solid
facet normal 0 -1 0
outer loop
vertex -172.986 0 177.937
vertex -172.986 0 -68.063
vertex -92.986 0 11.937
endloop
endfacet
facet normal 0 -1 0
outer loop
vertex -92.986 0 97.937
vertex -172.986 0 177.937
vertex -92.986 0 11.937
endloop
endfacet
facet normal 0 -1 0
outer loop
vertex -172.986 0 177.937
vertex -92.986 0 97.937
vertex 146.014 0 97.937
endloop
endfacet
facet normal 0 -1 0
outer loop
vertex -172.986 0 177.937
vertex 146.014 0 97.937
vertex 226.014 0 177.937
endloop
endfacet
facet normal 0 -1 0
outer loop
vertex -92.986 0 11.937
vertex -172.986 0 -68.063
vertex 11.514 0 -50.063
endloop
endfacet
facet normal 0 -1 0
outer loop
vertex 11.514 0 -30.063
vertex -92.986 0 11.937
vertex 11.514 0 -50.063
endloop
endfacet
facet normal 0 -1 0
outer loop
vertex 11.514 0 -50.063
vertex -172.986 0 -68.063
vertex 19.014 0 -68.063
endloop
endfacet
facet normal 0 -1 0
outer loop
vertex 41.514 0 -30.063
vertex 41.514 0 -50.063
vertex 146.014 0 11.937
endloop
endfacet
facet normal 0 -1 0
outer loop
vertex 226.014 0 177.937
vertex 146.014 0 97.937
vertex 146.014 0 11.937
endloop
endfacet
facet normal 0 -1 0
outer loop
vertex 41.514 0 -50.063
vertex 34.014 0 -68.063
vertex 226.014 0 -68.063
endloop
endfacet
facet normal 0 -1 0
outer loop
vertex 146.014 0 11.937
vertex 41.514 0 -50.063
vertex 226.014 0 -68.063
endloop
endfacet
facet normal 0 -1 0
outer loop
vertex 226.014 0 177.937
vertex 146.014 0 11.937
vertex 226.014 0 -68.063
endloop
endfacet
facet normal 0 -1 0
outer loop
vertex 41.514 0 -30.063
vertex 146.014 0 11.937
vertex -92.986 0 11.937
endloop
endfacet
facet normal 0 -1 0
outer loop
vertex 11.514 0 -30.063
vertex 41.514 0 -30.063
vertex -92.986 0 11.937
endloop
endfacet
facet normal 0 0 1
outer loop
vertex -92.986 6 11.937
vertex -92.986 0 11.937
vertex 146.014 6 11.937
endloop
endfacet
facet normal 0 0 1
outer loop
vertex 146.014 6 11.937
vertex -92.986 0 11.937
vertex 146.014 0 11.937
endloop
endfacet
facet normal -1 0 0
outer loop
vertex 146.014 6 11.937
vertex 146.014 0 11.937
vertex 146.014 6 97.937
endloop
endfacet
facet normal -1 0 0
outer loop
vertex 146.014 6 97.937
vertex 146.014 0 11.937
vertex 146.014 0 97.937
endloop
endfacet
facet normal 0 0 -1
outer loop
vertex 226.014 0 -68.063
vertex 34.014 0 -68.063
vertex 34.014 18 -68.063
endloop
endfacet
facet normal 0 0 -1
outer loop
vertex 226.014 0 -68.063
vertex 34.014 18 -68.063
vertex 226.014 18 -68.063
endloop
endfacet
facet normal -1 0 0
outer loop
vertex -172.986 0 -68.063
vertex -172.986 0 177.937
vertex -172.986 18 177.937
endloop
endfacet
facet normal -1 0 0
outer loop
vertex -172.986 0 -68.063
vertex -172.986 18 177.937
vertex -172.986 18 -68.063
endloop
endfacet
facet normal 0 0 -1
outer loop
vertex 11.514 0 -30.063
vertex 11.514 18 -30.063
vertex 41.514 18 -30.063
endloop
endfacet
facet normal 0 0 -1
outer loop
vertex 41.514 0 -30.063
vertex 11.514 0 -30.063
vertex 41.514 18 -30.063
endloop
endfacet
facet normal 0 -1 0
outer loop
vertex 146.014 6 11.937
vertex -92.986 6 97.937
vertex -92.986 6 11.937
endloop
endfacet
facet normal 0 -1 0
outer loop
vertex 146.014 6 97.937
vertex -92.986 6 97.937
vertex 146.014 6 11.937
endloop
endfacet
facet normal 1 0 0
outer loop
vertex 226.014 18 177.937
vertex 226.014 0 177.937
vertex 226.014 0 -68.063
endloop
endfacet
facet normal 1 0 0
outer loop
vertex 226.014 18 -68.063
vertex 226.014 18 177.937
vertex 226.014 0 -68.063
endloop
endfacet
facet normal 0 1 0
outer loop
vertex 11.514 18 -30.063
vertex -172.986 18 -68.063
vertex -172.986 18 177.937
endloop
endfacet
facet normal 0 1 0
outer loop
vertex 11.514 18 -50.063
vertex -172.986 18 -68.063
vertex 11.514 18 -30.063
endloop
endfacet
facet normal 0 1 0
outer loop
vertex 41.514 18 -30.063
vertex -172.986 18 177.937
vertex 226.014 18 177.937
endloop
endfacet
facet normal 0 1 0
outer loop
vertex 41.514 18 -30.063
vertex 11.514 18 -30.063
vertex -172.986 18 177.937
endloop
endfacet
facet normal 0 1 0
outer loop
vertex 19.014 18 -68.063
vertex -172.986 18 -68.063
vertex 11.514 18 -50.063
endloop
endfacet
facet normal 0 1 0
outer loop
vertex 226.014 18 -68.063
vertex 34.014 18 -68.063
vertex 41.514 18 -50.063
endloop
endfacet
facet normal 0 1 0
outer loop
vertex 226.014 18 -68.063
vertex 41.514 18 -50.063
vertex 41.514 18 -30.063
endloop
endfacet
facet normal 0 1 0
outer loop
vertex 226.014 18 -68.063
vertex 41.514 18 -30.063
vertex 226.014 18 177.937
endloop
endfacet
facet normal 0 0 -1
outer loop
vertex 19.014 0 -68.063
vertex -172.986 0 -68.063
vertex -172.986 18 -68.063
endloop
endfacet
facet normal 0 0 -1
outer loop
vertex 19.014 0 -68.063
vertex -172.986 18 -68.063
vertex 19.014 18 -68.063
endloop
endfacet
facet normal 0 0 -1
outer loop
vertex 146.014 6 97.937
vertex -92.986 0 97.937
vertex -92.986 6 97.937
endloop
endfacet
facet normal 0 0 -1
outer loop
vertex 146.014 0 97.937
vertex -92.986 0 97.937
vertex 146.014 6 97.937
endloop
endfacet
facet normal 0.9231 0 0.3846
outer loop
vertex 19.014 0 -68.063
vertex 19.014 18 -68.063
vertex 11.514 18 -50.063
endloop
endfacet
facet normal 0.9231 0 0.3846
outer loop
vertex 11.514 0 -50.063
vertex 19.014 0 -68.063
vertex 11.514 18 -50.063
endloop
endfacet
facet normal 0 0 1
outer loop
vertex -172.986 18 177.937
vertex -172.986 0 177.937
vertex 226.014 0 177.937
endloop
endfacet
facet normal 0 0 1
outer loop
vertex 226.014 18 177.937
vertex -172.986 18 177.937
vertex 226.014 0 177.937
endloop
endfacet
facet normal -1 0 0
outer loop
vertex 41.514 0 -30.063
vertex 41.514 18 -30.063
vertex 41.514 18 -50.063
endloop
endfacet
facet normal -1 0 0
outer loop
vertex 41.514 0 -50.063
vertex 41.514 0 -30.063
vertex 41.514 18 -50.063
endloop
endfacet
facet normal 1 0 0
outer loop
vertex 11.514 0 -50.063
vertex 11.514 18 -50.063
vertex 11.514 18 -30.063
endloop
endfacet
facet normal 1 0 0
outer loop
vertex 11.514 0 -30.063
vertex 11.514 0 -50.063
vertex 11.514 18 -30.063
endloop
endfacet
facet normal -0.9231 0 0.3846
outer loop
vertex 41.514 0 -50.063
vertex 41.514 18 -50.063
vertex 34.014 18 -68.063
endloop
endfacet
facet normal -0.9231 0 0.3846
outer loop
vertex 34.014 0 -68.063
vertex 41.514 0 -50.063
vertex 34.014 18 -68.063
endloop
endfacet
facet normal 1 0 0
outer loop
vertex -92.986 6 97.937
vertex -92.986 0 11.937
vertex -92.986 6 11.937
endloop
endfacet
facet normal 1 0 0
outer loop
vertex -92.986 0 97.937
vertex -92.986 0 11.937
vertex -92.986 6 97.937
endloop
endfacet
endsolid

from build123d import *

# Parameters (mm, degrees)
SKETCH1_W           = 399
SKETCH1_H           = 246
BOSS_EXTRUDE1_DEPTH = 18
SKETCH2_W           = 239
SKETCH2_H           = 86
CUT_EXTRUDE1_DEPTH  = 6
CUT_EXTRUDE2_REACH  = 290.215


with BuildPart() as part:
    # Sketch1 → Boss-Extrude1 (new body)
    with BuildSketch(Plane(origin=(0, 0, 0), x_dir=(1, 0, 0), z_dir=(0, 1, 0))):
        with Locations((26.513776337, -54.93719611)):
            Rectangle(SKETCH1_W, SKETCH1_H)
    extrude(amount=BOSS_EXTRUDE1_DEPTH)

    # Sketch2 → Cut-Extrude1 (cut)
    with BuildSketch(Plane.XZ):
        with Locations((26.513776337, 54.93719611)):
            Rectangle(SKETCH2_W, SKETCH2_H)
    extrude(amount=-CUT_EXTRUDE1_DEPTH, mode=Mode.SUBTRACT)

    # Sketch3 → Cut-Extrude2 (cut, up to next)
    with BuildSketch(Plane(origin=(0, 18, 0), x_dir=(1, 0, 0), z_dir=(0, 1, 0)), mode=Mode.PRIVATE) as cut_extrude2_sk1:
        Polygon((34.013776337, 68.06280389), (19.013776337, 68.06280389), (11.513776337, 50.06280389), (11.513776337, 30.06280389), (41.513776337, 30.06280389), (41.513776337, 50.06280389), align=None)
    cut_extrude2_tool1 = extrude(cut_extrude2_sk1.sketch, amount=-CUT_EXTRUDE2_REACH, mode=Mode.PRIVATE) & part.part
    add(cut_extrude2_tool1.solids().sort_by_distance((26.513776, 18, -47.316535))[0], mode=Mode.SUBTRACT)


solid = part.part
